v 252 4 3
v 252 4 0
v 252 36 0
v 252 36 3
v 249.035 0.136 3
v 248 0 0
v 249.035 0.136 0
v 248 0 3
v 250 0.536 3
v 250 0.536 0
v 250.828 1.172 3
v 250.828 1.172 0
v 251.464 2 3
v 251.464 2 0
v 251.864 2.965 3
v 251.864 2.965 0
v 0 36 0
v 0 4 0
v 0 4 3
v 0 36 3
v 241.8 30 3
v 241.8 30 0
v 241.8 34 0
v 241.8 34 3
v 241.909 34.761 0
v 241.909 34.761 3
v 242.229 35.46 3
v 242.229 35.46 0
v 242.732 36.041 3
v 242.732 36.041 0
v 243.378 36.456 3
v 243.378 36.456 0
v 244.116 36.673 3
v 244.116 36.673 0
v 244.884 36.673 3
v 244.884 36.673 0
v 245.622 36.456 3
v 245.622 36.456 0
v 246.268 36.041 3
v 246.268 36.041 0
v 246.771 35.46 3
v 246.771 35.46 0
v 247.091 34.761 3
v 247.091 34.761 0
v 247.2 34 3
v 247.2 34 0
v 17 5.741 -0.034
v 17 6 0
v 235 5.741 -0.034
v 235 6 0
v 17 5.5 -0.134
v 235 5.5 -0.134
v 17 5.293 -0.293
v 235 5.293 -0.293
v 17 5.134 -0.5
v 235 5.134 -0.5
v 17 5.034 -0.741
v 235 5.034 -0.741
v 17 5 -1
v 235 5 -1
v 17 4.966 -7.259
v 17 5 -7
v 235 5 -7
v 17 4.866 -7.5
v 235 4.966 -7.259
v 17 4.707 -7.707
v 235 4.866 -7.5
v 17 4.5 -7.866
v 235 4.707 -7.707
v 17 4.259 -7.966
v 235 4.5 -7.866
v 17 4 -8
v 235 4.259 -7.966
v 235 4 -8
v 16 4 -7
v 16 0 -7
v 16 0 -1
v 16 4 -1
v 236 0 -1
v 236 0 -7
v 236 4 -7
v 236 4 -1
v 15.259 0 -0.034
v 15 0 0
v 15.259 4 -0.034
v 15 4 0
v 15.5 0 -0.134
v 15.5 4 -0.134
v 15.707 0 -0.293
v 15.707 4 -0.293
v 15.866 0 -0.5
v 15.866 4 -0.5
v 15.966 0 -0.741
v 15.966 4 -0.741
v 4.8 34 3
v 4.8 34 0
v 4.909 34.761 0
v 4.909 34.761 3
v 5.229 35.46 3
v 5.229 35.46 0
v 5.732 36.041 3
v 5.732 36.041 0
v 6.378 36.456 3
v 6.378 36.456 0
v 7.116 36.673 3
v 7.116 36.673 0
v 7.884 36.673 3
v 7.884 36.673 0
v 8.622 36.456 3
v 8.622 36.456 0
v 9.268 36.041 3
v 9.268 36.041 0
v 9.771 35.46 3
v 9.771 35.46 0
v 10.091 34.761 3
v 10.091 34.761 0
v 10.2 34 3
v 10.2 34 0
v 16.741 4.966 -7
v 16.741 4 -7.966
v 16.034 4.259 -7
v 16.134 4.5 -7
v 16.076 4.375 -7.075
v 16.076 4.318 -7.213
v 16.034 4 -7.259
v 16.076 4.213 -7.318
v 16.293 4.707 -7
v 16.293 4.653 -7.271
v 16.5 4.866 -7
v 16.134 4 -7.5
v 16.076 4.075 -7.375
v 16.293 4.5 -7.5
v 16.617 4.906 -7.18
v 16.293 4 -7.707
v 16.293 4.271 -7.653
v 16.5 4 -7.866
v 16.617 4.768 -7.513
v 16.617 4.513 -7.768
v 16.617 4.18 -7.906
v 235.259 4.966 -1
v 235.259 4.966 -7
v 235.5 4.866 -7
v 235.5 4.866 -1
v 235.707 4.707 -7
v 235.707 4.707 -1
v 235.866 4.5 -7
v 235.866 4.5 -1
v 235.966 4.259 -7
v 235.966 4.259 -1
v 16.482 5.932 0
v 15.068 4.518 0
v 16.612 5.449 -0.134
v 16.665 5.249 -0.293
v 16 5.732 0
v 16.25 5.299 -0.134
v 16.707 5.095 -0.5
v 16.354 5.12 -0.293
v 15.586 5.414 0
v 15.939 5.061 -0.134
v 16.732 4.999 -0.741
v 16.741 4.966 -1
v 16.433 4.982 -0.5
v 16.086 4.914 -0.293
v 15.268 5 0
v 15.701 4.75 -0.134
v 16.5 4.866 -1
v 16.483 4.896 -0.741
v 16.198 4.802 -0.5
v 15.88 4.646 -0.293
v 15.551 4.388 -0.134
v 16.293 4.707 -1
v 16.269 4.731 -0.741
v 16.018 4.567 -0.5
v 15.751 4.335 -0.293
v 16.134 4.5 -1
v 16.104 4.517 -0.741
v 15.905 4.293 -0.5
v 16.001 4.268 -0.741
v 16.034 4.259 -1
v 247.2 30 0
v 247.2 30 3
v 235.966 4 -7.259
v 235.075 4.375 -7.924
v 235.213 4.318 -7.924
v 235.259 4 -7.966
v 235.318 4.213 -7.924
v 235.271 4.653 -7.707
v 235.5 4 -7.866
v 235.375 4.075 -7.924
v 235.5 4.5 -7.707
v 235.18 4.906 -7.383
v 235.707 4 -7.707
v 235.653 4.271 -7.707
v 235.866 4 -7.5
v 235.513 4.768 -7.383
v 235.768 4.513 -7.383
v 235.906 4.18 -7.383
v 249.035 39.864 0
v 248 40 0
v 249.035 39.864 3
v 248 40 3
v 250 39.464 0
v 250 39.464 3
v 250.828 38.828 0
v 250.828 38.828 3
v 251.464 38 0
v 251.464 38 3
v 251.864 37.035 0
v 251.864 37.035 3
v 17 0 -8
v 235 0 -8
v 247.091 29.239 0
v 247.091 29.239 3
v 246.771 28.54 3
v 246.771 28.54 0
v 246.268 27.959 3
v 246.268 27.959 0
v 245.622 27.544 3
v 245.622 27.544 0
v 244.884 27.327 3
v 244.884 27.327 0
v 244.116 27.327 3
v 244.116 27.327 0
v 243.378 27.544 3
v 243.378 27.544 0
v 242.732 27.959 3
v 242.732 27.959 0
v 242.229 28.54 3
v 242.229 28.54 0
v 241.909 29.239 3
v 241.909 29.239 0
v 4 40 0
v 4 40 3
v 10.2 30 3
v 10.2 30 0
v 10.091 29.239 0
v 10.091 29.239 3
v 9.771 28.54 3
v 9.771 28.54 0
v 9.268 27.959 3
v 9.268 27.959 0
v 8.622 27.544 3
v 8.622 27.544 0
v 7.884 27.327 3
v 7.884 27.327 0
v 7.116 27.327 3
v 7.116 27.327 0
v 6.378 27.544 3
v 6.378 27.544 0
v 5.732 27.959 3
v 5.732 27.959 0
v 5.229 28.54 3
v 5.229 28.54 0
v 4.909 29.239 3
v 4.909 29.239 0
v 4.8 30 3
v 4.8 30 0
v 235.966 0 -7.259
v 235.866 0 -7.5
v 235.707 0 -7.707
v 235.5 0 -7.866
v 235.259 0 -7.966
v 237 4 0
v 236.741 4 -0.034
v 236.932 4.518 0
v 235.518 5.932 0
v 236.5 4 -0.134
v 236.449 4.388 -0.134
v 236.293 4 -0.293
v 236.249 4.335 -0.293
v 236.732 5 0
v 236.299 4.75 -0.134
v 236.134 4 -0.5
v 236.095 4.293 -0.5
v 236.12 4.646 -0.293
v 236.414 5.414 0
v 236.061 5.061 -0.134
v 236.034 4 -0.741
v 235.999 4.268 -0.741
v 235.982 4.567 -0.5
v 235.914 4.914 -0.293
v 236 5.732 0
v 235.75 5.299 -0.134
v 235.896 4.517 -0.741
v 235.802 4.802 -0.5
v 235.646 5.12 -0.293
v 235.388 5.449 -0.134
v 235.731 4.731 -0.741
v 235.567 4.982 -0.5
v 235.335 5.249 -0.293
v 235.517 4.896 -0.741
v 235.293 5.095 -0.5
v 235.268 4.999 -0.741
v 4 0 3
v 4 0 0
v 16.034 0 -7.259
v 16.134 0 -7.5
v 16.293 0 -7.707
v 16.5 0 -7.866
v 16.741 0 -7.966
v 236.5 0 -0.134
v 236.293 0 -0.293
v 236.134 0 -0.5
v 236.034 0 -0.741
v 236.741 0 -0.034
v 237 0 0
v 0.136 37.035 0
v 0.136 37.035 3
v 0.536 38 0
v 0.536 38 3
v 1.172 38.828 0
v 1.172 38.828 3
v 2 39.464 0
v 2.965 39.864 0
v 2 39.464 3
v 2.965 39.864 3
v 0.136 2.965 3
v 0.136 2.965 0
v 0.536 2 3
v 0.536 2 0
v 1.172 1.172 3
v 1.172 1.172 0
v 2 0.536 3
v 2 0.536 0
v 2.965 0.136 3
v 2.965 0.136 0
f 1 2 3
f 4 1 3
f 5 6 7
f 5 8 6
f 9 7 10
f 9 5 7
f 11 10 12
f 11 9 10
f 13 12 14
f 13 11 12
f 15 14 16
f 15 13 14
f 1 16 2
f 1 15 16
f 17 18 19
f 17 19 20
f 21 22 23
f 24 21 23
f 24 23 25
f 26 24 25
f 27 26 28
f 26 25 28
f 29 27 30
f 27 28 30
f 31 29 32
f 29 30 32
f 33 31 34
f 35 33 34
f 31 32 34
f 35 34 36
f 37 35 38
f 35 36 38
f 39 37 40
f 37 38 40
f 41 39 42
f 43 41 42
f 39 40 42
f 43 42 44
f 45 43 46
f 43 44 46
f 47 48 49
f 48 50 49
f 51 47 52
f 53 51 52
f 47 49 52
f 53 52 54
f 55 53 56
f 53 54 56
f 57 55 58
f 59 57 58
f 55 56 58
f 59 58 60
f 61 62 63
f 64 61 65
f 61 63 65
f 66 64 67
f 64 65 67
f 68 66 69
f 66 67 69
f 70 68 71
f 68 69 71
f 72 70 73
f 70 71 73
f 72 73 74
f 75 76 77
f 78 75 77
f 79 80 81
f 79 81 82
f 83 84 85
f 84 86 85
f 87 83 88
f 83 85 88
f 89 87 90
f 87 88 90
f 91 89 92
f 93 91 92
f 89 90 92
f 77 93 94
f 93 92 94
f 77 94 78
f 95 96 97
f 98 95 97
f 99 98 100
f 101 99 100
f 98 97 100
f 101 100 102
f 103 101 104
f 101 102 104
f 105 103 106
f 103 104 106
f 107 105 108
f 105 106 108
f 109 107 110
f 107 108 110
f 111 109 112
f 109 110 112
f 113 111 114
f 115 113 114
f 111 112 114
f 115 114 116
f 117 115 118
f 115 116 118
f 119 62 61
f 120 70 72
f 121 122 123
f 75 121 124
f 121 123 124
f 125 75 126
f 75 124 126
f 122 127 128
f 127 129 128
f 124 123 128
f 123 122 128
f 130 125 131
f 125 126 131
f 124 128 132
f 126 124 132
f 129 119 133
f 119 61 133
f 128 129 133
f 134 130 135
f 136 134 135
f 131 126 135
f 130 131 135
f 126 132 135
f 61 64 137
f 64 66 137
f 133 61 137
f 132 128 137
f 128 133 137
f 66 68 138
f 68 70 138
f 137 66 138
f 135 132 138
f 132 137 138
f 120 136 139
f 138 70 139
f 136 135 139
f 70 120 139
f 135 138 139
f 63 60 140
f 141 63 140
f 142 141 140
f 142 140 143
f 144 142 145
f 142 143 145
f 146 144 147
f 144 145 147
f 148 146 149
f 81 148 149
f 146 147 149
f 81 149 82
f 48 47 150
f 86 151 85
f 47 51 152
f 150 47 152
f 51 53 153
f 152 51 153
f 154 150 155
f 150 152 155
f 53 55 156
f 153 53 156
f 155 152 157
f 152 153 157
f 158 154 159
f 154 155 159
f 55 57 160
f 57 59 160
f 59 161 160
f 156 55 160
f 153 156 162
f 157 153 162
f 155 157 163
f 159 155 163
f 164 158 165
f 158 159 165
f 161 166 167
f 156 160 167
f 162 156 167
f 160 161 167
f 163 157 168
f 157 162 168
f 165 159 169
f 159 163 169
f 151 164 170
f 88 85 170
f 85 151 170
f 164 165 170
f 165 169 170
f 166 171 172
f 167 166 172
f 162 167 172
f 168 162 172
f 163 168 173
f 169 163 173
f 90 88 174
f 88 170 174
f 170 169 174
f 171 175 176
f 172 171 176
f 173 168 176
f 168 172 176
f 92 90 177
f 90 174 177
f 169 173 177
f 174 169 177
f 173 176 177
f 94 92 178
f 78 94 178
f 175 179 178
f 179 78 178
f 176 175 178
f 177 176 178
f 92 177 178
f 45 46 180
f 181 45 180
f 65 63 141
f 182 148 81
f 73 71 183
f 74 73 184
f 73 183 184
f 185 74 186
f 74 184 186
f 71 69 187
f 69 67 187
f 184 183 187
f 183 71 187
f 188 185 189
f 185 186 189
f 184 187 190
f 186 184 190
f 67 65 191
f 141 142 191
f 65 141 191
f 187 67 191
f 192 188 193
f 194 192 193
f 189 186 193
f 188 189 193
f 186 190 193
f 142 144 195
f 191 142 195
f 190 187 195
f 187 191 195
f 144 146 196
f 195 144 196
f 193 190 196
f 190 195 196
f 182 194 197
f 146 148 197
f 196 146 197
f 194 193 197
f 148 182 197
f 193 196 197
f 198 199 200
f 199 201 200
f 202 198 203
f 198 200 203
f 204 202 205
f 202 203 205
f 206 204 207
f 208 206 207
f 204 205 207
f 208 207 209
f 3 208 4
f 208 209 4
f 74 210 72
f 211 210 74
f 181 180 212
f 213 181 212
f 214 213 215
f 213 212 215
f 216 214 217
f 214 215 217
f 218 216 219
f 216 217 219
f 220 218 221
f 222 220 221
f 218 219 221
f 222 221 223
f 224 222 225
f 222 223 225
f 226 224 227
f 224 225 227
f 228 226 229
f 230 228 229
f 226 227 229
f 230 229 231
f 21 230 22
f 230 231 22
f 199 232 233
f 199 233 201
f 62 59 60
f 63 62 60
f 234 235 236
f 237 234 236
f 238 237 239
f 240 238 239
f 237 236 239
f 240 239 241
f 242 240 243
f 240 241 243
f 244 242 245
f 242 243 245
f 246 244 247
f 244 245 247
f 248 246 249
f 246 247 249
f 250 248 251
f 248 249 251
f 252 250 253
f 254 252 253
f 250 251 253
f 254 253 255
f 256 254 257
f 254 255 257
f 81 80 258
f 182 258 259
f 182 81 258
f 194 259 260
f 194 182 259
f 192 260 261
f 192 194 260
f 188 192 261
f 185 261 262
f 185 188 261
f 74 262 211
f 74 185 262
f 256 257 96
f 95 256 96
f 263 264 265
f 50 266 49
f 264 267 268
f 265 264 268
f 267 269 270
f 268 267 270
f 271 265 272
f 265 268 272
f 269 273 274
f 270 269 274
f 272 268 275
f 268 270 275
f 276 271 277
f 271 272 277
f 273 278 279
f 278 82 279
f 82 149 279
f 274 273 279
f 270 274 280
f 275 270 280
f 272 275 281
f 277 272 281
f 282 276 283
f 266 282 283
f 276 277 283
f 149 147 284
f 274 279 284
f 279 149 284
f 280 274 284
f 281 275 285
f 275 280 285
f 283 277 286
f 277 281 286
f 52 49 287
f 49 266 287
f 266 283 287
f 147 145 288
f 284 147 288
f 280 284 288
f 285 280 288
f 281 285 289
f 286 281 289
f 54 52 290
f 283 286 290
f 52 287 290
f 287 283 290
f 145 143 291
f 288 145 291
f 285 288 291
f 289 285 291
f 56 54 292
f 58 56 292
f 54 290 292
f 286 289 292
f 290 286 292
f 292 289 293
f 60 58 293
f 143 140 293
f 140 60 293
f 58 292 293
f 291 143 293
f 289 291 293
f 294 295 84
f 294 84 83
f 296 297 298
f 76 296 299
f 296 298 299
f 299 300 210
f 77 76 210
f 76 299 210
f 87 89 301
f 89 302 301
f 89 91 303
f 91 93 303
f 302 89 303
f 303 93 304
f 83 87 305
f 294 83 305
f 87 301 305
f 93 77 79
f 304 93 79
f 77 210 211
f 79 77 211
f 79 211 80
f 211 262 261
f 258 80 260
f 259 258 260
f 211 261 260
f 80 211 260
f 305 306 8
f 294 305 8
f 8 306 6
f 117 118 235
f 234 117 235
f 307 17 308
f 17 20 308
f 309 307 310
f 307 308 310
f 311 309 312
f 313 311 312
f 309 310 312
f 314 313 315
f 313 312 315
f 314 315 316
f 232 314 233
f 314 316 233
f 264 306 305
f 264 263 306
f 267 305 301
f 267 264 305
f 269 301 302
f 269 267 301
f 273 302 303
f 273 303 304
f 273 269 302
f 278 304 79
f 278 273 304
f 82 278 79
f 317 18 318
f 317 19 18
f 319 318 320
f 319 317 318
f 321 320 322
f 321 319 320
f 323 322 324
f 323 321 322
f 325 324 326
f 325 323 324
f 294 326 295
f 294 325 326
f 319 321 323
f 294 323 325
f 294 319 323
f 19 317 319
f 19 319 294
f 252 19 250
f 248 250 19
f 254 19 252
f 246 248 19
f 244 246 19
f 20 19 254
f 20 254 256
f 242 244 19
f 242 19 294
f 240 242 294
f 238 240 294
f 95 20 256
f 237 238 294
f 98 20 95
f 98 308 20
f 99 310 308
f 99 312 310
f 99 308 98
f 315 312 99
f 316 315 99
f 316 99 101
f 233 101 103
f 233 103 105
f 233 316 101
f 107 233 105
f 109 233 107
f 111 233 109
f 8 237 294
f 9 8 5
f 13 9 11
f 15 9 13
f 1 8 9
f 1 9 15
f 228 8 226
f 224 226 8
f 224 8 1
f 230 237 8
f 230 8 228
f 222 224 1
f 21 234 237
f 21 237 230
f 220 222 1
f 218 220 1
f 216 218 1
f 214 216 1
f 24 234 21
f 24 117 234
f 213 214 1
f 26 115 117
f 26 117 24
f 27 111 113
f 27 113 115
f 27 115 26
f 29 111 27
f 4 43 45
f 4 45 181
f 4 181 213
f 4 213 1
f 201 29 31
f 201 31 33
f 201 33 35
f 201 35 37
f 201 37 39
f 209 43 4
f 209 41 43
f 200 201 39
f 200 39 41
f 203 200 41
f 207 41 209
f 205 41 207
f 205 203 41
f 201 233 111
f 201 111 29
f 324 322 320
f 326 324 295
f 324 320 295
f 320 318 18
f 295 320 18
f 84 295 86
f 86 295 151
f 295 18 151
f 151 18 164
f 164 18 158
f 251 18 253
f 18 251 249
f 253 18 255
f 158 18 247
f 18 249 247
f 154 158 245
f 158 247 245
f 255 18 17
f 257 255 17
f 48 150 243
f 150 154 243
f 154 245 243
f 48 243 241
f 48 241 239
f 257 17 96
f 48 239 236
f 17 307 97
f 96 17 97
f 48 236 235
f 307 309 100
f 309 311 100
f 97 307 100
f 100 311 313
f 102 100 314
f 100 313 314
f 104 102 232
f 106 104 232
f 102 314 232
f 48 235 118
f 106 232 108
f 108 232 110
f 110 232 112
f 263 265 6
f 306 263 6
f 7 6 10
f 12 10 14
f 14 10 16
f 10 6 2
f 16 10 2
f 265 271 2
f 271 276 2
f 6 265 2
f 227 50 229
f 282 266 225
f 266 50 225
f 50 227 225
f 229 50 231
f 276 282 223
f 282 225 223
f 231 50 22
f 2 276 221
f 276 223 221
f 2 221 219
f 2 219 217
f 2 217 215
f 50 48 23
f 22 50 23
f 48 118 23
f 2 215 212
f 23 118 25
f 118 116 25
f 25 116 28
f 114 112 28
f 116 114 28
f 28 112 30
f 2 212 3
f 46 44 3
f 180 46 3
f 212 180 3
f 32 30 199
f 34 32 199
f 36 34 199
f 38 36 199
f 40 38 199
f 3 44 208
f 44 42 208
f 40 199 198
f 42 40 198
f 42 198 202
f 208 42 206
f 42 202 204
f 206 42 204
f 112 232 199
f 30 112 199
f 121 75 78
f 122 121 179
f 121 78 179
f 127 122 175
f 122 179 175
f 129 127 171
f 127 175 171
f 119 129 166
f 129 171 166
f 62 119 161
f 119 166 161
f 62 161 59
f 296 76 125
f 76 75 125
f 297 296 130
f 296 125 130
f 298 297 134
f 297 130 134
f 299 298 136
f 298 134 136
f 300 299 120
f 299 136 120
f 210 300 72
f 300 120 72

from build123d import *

# Parameters (mm, degrees)
SKETCH1_W           = 252
SKETCH1_H           = 40
BOSS_EXTRUDE1_DEPTH = 3
SKETCH2_W           = 220
SKETCH2_H           = 8
BOSS_EXTRUDE2_DEPTH = 5
FILLET1_R           = 4
FILLET2_R           = 1


with BuildPart() as part:
    # Sketch1 → Boss-Extrude1 (new body)
    with BuildSketch(Plane.XY):
        with Locations((126, 20)):
            Rectangle(SKETCH1_W, SKETCH1_H)
        with BuildLine():
            Line((10.2, 34), (10.2, 30))
            ThreePointArc((10.2, 30), (7.5, 27.3), (4.8, 30))
            Line((4.8, 30), (4.8, 34))
            ThreePointArc((4.8, 34), (7.5, 36.7), (10.2, 34))
        make_face(mode=Mode.SUBTRACT)
        with BuildLine():
            Line((247.2, 34), (247.2, 30))
            ThreePointArc((247.2, 30), (244.5, 27.3), (241.8, 30))
            Line((241.8, 30), (241.8, 34))
            ThreePointArc((241.8, 34), (244.5, 36.7), (247.2, 34))
        make_face(mode=Mode.SUBTRACT)
    extrude(amount=BOSS_EXTRUDE1_DEPTH)

    # Sketch2 → Boss-Extrude2 (add)
    with BuildSketch(Plane.XZ):
        with Locations((126, -4)):
            Rectangle(SKETCH2_W, SKETCH2_H)
    extrude(amount=-BOSS_EXTRUDE2_DEPTH)

    # Fillet1
    fillet1_edges = [part.edges().sort_by_distance(p)[0] for p in [
        (0, 40, 1.5),
        (252, 40, 1.5),
        (252, 0, 1.5),
        (0, 0, 1.5),
    ]]
    fillet(fillet1_edges, radius=FILLET1_R)

    # Fillet2
    fillet2_edges = [part.edges().sort_by_distance(p)[0] for p in [
        (126, 5, 0),
        (16, 2.5, 0),
        (236, 5, -4),
        (236, 2.5, 0),
        (126, 5, -8),
        (236, 2.5, -8),
        (16, 5, -4),
        (16, 2.5, -8),
    ]]
    fillet(fillet2_edges, radius=FILLET2_R)


solid = part.part
